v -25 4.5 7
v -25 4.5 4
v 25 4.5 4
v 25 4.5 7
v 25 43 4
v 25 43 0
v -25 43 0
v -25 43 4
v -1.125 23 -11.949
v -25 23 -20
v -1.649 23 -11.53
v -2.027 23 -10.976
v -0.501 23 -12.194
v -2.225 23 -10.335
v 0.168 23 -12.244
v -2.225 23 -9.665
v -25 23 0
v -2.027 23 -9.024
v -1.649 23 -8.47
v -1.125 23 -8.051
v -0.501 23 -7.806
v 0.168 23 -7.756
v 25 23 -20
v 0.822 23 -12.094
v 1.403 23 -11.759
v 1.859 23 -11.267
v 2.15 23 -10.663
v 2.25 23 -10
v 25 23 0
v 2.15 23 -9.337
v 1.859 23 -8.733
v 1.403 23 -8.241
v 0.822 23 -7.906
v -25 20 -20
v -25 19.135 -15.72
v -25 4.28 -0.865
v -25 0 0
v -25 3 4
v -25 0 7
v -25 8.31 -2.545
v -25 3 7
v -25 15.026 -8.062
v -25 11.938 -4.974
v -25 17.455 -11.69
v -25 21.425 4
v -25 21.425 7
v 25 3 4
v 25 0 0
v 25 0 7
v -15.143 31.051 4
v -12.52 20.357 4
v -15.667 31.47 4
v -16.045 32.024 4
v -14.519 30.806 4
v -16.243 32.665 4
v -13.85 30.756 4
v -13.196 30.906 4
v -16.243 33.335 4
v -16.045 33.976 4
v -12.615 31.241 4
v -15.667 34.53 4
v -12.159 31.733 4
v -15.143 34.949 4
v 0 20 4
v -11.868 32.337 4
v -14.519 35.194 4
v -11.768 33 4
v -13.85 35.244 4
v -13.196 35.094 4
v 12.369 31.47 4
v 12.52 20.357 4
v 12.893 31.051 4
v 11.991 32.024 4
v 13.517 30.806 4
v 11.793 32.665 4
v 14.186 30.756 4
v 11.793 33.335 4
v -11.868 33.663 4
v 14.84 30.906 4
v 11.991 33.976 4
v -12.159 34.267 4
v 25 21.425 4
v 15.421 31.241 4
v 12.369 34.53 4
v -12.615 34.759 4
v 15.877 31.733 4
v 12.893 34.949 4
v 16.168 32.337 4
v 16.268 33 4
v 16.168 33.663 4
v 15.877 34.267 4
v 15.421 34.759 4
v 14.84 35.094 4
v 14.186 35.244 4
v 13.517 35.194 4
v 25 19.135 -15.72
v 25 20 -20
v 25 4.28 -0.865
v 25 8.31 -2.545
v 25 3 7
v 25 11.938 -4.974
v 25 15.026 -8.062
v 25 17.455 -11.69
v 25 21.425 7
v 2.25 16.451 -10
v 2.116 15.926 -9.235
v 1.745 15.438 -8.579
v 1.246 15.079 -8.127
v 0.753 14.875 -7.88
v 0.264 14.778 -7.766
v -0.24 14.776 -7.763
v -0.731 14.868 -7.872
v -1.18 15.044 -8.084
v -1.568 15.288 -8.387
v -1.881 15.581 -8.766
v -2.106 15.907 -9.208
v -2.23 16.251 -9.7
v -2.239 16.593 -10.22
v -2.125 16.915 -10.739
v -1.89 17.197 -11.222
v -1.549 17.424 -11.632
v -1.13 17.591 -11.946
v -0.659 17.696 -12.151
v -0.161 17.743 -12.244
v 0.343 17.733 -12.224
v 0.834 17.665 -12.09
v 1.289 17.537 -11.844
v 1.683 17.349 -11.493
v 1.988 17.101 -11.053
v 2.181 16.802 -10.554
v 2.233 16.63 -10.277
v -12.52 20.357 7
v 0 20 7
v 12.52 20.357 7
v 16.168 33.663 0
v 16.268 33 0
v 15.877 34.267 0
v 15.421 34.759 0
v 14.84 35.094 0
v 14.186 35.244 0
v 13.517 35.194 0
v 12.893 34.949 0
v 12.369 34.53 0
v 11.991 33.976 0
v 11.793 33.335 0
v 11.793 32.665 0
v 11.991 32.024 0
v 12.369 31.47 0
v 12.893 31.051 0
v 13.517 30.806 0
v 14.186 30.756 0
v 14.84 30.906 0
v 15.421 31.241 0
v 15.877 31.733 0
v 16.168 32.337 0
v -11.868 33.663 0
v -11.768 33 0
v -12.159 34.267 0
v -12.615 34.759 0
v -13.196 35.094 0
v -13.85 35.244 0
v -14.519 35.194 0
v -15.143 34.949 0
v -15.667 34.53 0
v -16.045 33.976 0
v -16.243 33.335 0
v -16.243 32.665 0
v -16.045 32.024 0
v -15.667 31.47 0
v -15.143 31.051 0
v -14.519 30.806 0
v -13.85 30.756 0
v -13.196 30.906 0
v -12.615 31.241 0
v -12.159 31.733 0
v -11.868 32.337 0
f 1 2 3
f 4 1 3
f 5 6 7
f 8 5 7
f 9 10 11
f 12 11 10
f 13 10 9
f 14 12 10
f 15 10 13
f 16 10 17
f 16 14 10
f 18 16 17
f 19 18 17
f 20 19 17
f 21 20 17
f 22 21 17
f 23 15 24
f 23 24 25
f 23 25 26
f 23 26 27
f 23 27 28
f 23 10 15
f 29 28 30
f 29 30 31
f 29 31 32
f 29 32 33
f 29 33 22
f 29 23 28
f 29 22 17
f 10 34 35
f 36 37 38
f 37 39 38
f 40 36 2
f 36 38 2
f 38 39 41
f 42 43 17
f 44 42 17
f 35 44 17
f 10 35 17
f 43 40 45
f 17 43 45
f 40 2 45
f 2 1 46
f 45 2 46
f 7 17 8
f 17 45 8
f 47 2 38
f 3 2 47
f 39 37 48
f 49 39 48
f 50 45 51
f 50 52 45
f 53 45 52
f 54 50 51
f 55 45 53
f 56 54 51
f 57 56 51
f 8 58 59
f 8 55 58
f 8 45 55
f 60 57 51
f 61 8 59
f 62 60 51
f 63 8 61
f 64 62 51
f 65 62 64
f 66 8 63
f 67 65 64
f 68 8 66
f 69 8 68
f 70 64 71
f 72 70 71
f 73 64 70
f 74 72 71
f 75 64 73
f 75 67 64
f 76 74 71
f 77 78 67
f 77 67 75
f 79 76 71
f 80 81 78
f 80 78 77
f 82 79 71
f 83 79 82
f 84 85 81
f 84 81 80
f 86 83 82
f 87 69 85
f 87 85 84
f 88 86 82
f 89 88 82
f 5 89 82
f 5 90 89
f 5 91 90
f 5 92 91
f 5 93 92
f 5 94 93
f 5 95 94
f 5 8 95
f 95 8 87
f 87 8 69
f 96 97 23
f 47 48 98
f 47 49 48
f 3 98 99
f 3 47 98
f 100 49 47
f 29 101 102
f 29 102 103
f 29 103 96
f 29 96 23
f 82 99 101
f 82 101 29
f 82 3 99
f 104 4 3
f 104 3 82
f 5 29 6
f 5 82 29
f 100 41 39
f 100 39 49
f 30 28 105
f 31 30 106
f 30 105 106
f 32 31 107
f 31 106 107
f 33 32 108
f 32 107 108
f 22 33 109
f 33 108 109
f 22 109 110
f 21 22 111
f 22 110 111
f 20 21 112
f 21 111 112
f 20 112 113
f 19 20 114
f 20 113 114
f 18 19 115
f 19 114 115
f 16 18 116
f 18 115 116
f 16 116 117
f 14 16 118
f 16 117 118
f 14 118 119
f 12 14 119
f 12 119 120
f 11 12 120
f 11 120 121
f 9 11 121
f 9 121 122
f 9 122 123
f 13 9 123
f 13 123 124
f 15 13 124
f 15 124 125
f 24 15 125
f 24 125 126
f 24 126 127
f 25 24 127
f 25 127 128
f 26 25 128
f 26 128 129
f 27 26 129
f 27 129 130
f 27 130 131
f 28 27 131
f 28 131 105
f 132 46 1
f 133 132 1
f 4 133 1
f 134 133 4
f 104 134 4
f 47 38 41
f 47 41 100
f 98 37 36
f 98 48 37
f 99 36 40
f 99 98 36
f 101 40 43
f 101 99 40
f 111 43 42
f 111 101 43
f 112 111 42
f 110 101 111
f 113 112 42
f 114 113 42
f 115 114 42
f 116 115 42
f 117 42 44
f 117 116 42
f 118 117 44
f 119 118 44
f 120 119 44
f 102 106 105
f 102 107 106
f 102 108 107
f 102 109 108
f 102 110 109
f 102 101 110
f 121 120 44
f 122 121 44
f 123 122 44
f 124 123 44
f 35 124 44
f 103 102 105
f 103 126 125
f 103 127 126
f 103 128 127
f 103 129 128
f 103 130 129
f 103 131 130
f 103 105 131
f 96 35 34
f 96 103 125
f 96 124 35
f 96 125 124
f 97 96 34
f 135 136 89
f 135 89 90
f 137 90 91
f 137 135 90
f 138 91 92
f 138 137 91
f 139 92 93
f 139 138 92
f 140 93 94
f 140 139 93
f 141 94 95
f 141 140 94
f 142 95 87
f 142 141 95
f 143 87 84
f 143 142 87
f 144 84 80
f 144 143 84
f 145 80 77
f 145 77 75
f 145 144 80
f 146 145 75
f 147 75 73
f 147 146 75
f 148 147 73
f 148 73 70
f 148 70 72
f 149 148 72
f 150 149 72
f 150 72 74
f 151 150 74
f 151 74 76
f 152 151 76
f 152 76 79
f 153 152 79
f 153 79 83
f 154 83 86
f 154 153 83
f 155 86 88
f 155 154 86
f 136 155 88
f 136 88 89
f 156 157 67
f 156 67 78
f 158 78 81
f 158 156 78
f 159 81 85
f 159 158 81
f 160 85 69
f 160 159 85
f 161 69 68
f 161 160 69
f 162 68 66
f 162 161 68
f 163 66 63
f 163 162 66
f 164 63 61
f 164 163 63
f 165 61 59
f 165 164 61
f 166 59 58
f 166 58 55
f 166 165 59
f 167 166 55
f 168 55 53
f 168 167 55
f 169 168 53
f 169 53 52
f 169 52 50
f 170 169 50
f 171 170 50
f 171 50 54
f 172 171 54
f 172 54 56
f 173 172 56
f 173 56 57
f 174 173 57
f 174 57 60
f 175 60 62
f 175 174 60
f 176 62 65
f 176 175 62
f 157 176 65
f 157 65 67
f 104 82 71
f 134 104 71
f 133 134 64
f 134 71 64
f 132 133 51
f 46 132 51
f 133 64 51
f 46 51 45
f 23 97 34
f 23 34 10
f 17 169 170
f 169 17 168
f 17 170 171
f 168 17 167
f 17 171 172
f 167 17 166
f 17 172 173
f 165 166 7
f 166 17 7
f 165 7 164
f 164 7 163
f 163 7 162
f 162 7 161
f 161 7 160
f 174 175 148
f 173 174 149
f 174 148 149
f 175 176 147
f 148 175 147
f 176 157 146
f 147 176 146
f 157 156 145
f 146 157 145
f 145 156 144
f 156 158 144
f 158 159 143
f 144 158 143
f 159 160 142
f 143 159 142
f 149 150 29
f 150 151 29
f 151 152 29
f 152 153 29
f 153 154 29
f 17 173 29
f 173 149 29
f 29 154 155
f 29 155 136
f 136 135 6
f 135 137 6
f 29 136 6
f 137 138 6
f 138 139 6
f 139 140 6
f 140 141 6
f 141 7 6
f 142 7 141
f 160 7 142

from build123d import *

# Parameters (mm, degrees)
F0_R          = 2.25
F0_W          = 50
F0_H          = 1.5
F0_H_2        = 3
F1_DEPTH      = 4
F2_DEPTH      = 7
F4_DEPTH      = 25
F4_DEPTH_BACK = 25
F6_R          = 2.25
F7_DEPTH      = 23
F6_R_2        = 3.75
F8_DEPTH      = 10


with BuildPart() as f1:
    # F0 (on Top) → F1 (new body)
    with BuildSketch(Plane.XY):
        with BuildLine():
            Line((-25, 43), (-25, 21.42507))
            ThreePointArc((-25, 21.42507), (0, 20), (25, 21.42507))
            Line((25, 21.42507), (25, 43))
            Line((25, 43), (-25, 43))
        make_face()
        with Locations((-14.01787, 33)):
            Circle(F0_R, mode=Mode.SUBTRACT)
        with Locations((14.01787, 33)):
            Circle(F0_R, mode=Mode.SUBTRACT)
        with BuildLine():
            ThreePointArc((25, 21.42507), (0, 20), (-25, 21.42507))
            Line((-25, 21.42507), (-25, 4.5))
            Line((-25, 4.5), (25, 4.5))
            Line((25, 4.5), (25, 21.42507))
        make_face()
        with Locations((0, 3.75)):
            Rectangle(F0_W, F0_H)
        with Locations((0, 1.5)):
            Rectangle(F0_W, F0_H_2)
    extrude(amount=F1_DEPTH)

    # F0 (on Top) → F2 (join)
    with BuildSketch(Plane.XY):
        with BuildLine():
            ThreePointArc((25, 21.42507), (0, 20), (-25, 21.42507))
            Line((-25, 21.42507), (-25, 4.5))
            Line((-25, 4.5), (25, 4.5))
            Line((25, 4.5), (25, 21.42507))
        make_face()
        with Locations((0, 1.5)):
            Rectangle(F0_W, F0_H_2)
    extrude(amount=F2_DEPTH)

    # F3 (on Right) → F4 (join, two sides)
    with BuildSketch(Plane.YZ) as f4_sk:
        with BuildLine():
            Line((23, 0), (0, 0))
            ThreePointArc((0, 0), (13.557431, -6.442569), (20, -20))
            Line((20, -20), (23, -20))
            Line((23, -20), (23, 0))
        make_face()
    extrude(amount=F4_DEPTH)
    extrude(f4_sk.sketch, amount=-F4_DEPTH_BACK)

    # F6 (on Front) → F7 (cut, through all)
    with BuildSketch(Plane.XZ):
        with Locations((0, -10)):
            Circle(F6_R)
    extrude(amount=-F7_DEPTH, mode=Mode.SUBTRACT)

    # F6 (on Front) → F8 (cut)
    with BuildSketch(Plane.XZ):
        with Locations((0, -10)):
            Circle(F6_R_2)
        with Locations((0, -10)):
            Circle(F6_R, mode=Mode.SUBTRACT)
    extrude(amount=-F8_DEPTH, mode=Mode.SUBTRACT)


solid = f1.part
